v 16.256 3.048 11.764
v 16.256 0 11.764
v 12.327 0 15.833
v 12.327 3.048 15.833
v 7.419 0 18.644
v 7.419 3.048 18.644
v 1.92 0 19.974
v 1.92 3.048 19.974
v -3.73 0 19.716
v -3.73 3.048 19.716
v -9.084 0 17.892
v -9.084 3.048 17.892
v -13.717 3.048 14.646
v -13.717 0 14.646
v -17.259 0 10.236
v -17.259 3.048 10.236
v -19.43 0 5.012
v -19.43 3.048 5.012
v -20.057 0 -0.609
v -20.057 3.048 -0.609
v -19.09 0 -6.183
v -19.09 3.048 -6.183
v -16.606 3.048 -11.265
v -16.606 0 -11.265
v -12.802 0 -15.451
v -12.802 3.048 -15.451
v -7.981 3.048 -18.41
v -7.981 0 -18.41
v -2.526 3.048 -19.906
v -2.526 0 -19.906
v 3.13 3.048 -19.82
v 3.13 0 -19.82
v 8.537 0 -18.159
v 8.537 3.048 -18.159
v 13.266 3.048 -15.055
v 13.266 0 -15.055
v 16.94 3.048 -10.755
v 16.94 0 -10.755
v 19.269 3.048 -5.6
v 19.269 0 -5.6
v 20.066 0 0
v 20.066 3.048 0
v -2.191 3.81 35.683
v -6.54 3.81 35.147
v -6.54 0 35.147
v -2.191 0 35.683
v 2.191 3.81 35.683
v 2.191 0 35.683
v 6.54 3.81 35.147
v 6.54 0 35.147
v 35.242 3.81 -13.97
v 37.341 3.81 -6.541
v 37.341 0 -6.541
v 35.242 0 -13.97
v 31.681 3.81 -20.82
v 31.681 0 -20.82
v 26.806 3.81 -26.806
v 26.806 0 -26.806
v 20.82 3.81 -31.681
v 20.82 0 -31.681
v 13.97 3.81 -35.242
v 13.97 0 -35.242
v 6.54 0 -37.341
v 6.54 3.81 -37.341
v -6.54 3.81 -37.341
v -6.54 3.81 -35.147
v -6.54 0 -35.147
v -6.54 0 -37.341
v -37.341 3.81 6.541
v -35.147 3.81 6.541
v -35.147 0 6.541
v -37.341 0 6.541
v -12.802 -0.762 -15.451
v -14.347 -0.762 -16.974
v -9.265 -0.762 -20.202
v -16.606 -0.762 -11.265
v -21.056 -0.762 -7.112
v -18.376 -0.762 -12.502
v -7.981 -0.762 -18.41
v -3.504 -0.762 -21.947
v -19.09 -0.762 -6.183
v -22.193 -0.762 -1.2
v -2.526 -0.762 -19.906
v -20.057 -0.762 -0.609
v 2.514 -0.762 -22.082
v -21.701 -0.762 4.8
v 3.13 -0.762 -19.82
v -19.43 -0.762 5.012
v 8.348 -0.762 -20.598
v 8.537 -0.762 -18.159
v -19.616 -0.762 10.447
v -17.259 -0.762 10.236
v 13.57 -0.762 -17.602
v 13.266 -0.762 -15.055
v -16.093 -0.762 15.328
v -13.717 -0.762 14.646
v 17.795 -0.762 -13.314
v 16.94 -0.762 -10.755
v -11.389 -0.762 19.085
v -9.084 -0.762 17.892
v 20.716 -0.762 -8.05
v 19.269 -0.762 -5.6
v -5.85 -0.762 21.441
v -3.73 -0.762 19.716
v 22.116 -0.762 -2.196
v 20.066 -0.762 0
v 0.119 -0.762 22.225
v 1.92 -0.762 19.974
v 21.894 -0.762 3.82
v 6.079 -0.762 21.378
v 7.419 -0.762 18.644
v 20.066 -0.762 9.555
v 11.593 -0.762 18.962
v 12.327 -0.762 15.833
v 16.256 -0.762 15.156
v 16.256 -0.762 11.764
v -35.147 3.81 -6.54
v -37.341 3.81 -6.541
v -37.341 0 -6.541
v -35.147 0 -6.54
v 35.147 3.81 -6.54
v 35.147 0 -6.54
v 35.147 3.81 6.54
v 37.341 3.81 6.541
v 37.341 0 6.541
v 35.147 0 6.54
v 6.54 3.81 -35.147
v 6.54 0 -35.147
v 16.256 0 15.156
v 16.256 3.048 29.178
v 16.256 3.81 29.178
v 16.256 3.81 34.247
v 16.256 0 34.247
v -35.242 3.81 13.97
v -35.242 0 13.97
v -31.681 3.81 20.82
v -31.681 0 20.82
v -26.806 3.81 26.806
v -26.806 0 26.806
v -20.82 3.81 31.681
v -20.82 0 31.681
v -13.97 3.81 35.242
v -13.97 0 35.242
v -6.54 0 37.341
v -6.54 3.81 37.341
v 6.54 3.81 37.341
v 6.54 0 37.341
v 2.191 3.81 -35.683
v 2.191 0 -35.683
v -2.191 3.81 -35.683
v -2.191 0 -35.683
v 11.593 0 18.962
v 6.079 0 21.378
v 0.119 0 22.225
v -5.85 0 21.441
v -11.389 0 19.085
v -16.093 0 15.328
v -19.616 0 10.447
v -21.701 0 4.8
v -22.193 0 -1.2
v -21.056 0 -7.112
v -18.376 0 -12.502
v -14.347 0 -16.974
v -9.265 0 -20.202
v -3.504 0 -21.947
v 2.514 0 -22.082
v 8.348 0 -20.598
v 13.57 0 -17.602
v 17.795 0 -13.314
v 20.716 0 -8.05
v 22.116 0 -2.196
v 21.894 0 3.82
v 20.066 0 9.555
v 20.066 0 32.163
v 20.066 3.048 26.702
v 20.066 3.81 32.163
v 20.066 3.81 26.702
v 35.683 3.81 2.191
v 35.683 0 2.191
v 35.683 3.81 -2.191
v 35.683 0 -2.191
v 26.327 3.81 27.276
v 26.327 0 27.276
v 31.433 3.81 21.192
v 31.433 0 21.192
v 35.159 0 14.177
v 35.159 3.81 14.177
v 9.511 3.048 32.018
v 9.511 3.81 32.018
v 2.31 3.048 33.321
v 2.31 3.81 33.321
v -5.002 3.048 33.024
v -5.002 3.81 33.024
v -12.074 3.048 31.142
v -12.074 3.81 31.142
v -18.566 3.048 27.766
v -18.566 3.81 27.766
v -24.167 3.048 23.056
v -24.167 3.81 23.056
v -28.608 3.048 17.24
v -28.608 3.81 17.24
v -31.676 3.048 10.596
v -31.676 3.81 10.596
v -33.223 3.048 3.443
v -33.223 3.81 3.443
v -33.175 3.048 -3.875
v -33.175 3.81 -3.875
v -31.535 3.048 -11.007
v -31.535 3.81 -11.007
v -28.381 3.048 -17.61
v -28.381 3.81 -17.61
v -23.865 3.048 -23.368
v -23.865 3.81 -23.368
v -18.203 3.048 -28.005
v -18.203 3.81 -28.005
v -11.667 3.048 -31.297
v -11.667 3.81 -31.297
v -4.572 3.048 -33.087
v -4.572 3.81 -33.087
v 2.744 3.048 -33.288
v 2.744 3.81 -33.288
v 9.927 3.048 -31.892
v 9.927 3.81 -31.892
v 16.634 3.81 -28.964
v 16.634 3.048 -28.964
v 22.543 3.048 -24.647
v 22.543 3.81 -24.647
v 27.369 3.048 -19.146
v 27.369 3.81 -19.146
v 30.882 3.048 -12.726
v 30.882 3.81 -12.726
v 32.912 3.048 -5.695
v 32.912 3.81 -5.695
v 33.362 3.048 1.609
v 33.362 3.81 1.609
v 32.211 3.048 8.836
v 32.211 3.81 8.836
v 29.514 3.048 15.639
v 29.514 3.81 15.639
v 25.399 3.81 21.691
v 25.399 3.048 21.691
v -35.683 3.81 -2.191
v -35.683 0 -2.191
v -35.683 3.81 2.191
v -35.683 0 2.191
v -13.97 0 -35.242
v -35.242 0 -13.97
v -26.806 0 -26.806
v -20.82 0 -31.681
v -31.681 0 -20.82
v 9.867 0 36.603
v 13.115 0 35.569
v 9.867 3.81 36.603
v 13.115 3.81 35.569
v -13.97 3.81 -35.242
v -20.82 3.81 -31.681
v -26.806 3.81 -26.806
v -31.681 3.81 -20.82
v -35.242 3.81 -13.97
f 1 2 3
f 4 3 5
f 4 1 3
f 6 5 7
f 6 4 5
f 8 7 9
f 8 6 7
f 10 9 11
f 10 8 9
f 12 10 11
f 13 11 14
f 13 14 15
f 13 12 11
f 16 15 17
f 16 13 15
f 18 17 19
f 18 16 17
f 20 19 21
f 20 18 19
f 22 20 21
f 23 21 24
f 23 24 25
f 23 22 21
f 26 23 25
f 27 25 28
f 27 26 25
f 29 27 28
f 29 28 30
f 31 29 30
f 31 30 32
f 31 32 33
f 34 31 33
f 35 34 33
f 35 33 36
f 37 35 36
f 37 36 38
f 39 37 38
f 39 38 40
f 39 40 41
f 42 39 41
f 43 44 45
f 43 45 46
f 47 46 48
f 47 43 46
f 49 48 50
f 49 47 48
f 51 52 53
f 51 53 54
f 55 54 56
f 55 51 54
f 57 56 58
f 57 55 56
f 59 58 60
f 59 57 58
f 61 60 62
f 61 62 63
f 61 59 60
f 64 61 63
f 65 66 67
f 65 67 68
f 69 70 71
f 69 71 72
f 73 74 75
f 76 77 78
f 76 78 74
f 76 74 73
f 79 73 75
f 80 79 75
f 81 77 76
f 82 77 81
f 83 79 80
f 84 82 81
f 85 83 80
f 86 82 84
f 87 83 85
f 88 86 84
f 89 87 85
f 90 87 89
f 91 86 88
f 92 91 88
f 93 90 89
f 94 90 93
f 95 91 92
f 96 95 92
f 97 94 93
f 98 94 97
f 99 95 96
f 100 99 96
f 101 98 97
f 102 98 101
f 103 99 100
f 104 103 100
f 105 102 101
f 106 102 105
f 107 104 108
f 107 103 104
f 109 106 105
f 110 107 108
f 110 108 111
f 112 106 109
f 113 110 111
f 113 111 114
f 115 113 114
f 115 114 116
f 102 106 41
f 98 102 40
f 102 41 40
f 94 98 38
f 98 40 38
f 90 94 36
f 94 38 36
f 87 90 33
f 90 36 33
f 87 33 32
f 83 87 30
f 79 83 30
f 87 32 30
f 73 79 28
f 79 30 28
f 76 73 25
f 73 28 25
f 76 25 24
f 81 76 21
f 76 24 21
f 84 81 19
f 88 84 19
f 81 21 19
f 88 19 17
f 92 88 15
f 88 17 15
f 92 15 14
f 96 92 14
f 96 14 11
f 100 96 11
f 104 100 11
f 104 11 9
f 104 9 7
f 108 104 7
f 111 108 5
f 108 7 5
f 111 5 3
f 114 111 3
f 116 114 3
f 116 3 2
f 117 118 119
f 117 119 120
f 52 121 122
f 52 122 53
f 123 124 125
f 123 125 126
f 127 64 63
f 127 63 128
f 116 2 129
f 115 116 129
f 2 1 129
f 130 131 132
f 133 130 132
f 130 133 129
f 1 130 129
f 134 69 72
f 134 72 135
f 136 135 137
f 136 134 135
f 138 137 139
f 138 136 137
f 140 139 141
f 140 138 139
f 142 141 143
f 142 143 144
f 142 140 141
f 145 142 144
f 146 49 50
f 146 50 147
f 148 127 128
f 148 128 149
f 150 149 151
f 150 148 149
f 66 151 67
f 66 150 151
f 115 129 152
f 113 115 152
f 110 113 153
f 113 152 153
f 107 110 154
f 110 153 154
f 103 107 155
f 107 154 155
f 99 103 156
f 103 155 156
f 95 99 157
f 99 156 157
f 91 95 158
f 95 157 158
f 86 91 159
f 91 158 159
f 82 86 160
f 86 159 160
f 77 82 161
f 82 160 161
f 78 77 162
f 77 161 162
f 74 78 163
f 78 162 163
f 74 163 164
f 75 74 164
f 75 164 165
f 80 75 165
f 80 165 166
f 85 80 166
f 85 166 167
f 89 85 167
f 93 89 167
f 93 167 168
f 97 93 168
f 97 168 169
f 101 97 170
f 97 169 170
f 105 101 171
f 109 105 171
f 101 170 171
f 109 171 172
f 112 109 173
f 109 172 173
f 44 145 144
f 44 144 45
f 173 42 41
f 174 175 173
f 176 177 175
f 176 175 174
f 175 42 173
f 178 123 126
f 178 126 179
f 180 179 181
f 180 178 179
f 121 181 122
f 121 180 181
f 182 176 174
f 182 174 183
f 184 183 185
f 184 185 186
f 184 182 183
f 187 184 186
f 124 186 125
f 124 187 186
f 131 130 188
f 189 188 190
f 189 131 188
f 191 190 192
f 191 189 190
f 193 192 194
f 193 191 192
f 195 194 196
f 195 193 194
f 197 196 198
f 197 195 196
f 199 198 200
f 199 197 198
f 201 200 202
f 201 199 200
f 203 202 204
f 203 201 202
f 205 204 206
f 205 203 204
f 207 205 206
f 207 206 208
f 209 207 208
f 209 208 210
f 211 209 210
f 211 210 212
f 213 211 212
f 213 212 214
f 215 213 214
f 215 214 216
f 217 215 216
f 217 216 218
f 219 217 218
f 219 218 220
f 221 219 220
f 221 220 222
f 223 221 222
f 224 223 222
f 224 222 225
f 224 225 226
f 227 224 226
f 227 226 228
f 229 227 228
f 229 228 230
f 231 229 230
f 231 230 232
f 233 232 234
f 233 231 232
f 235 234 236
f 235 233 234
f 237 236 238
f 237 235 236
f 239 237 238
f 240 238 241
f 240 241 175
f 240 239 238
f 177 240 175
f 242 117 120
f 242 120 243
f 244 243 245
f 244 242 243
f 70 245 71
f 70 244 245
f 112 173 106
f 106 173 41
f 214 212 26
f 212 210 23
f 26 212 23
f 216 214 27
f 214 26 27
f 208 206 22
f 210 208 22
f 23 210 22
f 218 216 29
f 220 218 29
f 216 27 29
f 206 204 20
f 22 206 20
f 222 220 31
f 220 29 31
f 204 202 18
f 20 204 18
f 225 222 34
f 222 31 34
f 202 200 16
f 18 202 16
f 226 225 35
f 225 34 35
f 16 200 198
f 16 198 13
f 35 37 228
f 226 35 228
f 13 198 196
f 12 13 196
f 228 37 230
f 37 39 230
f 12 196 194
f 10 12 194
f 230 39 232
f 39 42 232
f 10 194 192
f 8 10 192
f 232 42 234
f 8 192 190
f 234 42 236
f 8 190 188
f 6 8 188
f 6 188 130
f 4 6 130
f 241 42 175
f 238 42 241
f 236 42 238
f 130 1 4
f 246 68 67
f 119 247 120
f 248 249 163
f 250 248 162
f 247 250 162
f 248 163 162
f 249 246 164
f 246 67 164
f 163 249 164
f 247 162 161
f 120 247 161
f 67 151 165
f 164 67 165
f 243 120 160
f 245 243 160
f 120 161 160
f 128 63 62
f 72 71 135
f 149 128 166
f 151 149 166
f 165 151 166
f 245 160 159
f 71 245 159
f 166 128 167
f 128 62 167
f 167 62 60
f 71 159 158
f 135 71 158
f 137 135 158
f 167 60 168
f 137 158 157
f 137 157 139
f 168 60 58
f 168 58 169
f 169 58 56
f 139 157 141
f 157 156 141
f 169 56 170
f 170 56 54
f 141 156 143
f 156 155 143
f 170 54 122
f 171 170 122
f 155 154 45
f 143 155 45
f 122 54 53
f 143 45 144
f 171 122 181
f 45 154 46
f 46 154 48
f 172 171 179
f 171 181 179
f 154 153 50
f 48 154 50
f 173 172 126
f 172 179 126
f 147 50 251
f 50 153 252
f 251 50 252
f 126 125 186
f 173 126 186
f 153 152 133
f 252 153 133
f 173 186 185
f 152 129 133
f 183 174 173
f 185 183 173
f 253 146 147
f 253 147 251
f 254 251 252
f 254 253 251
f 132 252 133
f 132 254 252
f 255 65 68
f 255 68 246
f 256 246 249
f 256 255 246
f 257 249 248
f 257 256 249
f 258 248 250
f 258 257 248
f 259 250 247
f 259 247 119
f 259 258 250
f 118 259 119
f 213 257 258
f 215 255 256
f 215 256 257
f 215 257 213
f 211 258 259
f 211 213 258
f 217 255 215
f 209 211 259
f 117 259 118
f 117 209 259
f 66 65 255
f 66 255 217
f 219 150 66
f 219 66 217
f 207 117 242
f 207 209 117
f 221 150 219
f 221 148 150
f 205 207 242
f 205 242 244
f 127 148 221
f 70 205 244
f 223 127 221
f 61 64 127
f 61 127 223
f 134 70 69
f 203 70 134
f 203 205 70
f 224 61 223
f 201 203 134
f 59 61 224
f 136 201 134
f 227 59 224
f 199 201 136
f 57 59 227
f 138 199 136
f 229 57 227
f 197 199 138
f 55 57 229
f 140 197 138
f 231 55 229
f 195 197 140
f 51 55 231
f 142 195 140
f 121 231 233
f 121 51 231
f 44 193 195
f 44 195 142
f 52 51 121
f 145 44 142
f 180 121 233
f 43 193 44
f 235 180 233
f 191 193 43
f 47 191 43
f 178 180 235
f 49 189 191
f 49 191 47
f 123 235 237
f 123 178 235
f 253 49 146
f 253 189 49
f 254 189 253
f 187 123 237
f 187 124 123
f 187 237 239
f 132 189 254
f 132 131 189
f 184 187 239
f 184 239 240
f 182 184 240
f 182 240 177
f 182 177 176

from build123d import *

# Parameters (mm, degrees)
SKETCH1_R           = 15.24
CUT_EXTRUDE1_START  = -3.81
CUT_EXTRUDE1_DEPTH  = 3.81
SKETCH17_R          = 33.401
CUT_EXTRUDE4_DEPTH  = 0.762
BOSS_EXTRUDE1_DEPTH = 0.762


with BuildPart() as part:
    # Sweep1: sweep along a path in Sketch14
    with BuildLine(Plane(origin=(0, 0, 0), x_dir=(0, 0, -1), z_dir=(1, 0, 0))) as sweep1_path:
        Line((35.814, 0), (35.814, 3.81))
    # Sketch1 → Sweep1 (sweep)
    with BuildSketch(Plane(origin=(0, 0, 0), x_dir=(1, 0, 0), z_dir=(0, 1, 0))):
        with BuildLine():
            Line((35.147120935, 6.5405), (37.341023687, 6.5405))
            ThreePointArc((37.341023687, 6.5405), (26.806064521, 26.806064521), (6.5405, 37.341023687))
            Line((6.5405, 37.341023687), (6.5405, 35.147120935))
            ThreePointArc((6.5405, 35.147120935), (0, 35.7505), (-6.5405, 35.147120935))
            Line((-6.5405, 35.147120935), (-6.5405, 37.341023687))
            ThreePointArc((-6.5405, 37.341023687), (-26.806064521, 26.806064521), (-37.341023687, 6.5405))
            Line((-37.341023687, 6.5405), (-35.147120935, 6.5405))
            ThreePointArc((-35.147120935, 6.5405), (-35.7505, 0), (-35.147120935, -6.5405))
            Line((-35.147120935, -6.5405), (-37.341023687, -6.5405))
            ThreePointArc((-37.341023687, -6.5405), (-26.806064521, -26.806064521), (-6.5405, -37.341023687))
            Line((-6.5405, -37.341023687), (-6.5405, -35.147120935))
            ThreePointArc((-6.5405, -35.147120935), (0, -35.7505), (6.5405, -35.147120935))
            Line((6.5405, -35.147120935), (6.5405, -37.341023687))
            ThreePointArc((6.5405, -37.341023687), (26.806064521, -26.806064521), (37.341023687, -6.5405))
            Line((37.341023687, -6.5405), (35.147120935, -6.5405))
            ThreePointArc((35.147120935, -6.5405), (35.7505, 0), (35.147120935, 6.5405))
        make_face()
        Circle(SKETCH1_R, mode=Mode.SUBTRACT)
    sweep(path=sweep1_path.line)

    # Sketch2 → Cut-Extrude1 (cut)
    with BuildSketch(Plane.XZ.offset(CUT_EXTRUDE1_START)):
        with BuildLine():
            Line((16.256, 37.235541419), (16.256, 11.763792756))
            ThreePointArc((16.256, 11.763792756), (-19.089751858, -6.182696014), (20.066, 0))
            Line((20.066, 0), (20.066, 35.328440735))
            ThreePointArc((20.066, 35.328440735), (18.186016036, 36.331968038), (16.256, 37.235541419))
        make_face()
    extrude(amount=CUT_EXTRUDE1_DEPTH, mode=Mode.SUBTRACT)

    # Sketch17 → Cut-Extrude4 (cut)
    with BuildSketch(Plane.XZ.offset(-3.81)):
        Circle(SKETCH17_R)
    extrude(amount=CUT_EXTRUDE4_DEPTH, mode=Mode.SUBTRACT)

    # Sketch19 → Boss-Extrude1 (add)
    with BuildSketch(Plane.XZ):
        with BuildLine():
            Line((16.256, 11.763792756), (16.256, 15.155628954))
            ThreePointArc((16.256, 15.155628954), (-18.375594526, -12.501525939), (20.066, 9.555431387))
            Line((20.066, 9.555431387), (20.066, 0))
            ThreePointArc((20.066, 0), (-19.089751858, -6.182696014), (16.256, 11.763792756))
        make_face()
    extrude(amount=BOSS_EXTRUDE1_DEPTH)


solid = part.part
